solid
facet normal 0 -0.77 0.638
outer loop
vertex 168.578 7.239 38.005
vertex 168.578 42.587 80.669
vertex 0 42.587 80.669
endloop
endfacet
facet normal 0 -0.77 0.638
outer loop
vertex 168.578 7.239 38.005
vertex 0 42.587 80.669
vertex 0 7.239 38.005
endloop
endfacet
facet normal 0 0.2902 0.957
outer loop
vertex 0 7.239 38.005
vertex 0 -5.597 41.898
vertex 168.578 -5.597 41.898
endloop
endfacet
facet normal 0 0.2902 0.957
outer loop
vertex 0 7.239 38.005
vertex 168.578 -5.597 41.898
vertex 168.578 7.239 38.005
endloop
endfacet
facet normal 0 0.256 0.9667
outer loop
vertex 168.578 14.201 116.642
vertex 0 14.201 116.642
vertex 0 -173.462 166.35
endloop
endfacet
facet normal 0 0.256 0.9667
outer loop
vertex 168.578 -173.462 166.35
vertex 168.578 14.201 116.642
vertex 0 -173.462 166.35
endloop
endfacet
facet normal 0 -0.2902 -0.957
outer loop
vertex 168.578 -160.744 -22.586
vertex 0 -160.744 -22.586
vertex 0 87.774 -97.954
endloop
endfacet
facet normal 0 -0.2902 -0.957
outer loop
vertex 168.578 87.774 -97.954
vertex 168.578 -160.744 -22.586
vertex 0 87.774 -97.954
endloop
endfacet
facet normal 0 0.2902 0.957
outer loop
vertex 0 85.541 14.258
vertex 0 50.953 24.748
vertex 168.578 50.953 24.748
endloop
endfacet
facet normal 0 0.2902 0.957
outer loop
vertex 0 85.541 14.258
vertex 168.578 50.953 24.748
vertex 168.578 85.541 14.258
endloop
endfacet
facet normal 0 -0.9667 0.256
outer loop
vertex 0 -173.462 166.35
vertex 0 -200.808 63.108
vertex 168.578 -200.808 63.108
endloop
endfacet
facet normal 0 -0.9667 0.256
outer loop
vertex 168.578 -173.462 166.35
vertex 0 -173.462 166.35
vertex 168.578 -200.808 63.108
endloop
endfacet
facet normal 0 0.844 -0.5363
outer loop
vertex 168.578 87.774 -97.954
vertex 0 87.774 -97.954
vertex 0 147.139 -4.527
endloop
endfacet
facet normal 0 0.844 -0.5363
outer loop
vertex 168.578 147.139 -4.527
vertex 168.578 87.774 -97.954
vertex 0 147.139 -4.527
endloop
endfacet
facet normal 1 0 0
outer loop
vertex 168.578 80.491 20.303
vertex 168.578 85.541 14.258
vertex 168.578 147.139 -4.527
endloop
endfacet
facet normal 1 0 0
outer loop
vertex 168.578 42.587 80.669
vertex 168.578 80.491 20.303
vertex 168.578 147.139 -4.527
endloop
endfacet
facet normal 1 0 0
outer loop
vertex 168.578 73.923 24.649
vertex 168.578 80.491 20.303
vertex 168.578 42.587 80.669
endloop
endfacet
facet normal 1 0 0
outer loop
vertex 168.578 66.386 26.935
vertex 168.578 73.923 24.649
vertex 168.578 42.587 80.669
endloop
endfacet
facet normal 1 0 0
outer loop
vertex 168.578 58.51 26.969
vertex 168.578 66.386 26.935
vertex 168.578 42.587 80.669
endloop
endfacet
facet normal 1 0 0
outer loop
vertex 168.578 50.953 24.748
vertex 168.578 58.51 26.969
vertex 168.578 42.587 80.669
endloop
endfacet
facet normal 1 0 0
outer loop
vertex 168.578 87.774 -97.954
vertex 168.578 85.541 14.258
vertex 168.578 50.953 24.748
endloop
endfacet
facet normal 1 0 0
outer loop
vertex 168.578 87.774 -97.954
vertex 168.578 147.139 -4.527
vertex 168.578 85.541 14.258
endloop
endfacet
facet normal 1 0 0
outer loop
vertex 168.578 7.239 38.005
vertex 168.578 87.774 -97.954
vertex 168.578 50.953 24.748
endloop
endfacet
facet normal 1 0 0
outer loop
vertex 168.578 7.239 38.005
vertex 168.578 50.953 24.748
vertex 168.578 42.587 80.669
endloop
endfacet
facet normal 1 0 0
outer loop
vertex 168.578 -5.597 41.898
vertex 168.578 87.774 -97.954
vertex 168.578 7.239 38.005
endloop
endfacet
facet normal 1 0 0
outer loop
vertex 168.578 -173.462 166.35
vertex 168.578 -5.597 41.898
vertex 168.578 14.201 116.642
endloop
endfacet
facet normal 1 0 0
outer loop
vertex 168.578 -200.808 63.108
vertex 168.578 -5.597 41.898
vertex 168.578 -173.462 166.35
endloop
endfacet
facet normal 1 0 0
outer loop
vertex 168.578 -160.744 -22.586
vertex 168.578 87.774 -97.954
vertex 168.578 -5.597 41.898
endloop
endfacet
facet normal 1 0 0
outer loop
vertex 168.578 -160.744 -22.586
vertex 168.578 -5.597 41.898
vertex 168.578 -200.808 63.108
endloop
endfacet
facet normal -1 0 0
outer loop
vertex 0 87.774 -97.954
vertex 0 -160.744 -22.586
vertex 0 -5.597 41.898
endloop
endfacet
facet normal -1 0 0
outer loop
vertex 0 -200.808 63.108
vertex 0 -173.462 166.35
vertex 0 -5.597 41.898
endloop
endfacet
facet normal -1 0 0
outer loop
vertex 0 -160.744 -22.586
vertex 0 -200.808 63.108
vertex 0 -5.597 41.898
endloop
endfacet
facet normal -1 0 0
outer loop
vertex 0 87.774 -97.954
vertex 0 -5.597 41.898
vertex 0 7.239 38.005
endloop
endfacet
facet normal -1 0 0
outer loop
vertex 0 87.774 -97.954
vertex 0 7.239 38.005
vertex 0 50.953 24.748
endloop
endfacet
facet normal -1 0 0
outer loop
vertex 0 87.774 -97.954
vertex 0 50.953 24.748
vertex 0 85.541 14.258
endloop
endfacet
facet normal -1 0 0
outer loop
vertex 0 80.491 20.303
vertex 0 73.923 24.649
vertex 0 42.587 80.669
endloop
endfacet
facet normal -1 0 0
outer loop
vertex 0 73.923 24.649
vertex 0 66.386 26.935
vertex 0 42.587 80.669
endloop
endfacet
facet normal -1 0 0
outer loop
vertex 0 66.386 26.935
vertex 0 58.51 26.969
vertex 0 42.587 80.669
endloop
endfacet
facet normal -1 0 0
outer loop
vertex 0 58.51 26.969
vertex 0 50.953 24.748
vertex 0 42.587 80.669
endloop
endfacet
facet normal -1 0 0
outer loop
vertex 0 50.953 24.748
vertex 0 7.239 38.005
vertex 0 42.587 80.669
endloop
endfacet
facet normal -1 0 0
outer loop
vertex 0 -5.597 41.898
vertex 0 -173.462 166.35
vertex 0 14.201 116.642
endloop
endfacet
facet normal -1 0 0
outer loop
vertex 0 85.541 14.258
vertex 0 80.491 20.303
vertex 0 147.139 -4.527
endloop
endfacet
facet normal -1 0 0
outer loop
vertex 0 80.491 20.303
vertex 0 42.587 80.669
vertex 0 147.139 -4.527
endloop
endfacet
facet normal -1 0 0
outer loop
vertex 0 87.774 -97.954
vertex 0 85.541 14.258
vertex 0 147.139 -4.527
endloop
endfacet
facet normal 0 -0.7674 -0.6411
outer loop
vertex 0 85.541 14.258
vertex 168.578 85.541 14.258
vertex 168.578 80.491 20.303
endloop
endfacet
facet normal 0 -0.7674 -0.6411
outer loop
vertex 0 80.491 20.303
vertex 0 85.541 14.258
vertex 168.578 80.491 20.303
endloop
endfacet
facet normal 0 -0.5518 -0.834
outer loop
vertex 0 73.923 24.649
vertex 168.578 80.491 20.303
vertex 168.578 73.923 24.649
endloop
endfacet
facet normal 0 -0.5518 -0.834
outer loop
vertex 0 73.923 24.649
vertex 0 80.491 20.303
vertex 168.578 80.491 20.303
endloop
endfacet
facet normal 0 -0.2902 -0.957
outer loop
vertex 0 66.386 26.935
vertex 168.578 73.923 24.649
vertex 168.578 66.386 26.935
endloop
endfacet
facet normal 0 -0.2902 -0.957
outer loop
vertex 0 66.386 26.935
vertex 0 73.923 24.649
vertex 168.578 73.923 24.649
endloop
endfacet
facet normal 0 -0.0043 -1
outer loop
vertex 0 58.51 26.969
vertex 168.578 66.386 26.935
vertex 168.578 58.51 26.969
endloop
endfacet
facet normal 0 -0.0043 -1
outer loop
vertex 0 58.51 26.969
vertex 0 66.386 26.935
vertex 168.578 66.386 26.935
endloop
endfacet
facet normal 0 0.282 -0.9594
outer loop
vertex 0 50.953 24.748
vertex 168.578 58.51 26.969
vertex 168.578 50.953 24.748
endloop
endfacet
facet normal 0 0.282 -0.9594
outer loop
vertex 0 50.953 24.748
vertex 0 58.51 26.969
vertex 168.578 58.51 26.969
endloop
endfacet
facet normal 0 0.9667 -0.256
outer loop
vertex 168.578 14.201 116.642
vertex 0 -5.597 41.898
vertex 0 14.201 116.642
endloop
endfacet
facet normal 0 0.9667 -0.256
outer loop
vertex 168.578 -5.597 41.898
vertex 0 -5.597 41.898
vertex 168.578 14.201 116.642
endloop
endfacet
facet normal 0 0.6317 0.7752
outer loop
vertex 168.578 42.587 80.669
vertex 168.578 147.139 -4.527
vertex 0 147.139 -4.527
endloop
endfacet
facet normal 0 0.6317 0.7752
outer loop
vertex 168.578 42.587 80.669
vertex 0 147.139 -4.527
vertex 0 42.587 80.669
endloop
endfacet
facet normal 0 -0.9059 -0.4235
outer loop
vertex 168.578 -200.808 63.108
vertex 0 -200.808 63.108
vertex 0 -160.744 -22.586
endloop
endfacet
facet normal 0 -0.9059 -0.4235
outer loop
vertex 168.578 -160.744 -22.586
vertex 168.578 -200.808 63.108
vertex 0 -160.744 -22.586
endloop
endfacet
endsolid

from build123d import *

# Parameters (mm, degrees)
F0_R     = 27.2385686344
F1_DEPTH = 168.578363955
F2_DEPTH = 106.8018544465


with BuildPart() as f1:
    # F0 (on Right) → F1 (new body)
    with BuildSketch(Plane.YZ):
        Polygon((42.5867140293, 80.6694477797), (-13.1449922919, 13.4008079767), (-200.8079886436, 63.1083771586), (-160.7436537743, -22.5856415927), (87.7742916346, -97.9538932443), (147.1385359764, -4.5265853405), align=None)
        with Locations((62.3324811459, 0)):
            Circle(F0_R, mode=Mode.SUBTRACT)
    extrude(amount=F1_DEPTH)

    # F2 (add): faces of the model
    f2_faces = [f1.faces().sort_by_distance(p)[0] for p in [
        (84.2891819775, -106.9764904678, 38.2545925677),
        (84.2891819775, -36.4846810699, -60.2697674185),
    ]]
    extrude(f2_faces, amount=F2_DEPTH, dir=(0, 0.2560469353, 0.9666643507))


solid = f1.part
